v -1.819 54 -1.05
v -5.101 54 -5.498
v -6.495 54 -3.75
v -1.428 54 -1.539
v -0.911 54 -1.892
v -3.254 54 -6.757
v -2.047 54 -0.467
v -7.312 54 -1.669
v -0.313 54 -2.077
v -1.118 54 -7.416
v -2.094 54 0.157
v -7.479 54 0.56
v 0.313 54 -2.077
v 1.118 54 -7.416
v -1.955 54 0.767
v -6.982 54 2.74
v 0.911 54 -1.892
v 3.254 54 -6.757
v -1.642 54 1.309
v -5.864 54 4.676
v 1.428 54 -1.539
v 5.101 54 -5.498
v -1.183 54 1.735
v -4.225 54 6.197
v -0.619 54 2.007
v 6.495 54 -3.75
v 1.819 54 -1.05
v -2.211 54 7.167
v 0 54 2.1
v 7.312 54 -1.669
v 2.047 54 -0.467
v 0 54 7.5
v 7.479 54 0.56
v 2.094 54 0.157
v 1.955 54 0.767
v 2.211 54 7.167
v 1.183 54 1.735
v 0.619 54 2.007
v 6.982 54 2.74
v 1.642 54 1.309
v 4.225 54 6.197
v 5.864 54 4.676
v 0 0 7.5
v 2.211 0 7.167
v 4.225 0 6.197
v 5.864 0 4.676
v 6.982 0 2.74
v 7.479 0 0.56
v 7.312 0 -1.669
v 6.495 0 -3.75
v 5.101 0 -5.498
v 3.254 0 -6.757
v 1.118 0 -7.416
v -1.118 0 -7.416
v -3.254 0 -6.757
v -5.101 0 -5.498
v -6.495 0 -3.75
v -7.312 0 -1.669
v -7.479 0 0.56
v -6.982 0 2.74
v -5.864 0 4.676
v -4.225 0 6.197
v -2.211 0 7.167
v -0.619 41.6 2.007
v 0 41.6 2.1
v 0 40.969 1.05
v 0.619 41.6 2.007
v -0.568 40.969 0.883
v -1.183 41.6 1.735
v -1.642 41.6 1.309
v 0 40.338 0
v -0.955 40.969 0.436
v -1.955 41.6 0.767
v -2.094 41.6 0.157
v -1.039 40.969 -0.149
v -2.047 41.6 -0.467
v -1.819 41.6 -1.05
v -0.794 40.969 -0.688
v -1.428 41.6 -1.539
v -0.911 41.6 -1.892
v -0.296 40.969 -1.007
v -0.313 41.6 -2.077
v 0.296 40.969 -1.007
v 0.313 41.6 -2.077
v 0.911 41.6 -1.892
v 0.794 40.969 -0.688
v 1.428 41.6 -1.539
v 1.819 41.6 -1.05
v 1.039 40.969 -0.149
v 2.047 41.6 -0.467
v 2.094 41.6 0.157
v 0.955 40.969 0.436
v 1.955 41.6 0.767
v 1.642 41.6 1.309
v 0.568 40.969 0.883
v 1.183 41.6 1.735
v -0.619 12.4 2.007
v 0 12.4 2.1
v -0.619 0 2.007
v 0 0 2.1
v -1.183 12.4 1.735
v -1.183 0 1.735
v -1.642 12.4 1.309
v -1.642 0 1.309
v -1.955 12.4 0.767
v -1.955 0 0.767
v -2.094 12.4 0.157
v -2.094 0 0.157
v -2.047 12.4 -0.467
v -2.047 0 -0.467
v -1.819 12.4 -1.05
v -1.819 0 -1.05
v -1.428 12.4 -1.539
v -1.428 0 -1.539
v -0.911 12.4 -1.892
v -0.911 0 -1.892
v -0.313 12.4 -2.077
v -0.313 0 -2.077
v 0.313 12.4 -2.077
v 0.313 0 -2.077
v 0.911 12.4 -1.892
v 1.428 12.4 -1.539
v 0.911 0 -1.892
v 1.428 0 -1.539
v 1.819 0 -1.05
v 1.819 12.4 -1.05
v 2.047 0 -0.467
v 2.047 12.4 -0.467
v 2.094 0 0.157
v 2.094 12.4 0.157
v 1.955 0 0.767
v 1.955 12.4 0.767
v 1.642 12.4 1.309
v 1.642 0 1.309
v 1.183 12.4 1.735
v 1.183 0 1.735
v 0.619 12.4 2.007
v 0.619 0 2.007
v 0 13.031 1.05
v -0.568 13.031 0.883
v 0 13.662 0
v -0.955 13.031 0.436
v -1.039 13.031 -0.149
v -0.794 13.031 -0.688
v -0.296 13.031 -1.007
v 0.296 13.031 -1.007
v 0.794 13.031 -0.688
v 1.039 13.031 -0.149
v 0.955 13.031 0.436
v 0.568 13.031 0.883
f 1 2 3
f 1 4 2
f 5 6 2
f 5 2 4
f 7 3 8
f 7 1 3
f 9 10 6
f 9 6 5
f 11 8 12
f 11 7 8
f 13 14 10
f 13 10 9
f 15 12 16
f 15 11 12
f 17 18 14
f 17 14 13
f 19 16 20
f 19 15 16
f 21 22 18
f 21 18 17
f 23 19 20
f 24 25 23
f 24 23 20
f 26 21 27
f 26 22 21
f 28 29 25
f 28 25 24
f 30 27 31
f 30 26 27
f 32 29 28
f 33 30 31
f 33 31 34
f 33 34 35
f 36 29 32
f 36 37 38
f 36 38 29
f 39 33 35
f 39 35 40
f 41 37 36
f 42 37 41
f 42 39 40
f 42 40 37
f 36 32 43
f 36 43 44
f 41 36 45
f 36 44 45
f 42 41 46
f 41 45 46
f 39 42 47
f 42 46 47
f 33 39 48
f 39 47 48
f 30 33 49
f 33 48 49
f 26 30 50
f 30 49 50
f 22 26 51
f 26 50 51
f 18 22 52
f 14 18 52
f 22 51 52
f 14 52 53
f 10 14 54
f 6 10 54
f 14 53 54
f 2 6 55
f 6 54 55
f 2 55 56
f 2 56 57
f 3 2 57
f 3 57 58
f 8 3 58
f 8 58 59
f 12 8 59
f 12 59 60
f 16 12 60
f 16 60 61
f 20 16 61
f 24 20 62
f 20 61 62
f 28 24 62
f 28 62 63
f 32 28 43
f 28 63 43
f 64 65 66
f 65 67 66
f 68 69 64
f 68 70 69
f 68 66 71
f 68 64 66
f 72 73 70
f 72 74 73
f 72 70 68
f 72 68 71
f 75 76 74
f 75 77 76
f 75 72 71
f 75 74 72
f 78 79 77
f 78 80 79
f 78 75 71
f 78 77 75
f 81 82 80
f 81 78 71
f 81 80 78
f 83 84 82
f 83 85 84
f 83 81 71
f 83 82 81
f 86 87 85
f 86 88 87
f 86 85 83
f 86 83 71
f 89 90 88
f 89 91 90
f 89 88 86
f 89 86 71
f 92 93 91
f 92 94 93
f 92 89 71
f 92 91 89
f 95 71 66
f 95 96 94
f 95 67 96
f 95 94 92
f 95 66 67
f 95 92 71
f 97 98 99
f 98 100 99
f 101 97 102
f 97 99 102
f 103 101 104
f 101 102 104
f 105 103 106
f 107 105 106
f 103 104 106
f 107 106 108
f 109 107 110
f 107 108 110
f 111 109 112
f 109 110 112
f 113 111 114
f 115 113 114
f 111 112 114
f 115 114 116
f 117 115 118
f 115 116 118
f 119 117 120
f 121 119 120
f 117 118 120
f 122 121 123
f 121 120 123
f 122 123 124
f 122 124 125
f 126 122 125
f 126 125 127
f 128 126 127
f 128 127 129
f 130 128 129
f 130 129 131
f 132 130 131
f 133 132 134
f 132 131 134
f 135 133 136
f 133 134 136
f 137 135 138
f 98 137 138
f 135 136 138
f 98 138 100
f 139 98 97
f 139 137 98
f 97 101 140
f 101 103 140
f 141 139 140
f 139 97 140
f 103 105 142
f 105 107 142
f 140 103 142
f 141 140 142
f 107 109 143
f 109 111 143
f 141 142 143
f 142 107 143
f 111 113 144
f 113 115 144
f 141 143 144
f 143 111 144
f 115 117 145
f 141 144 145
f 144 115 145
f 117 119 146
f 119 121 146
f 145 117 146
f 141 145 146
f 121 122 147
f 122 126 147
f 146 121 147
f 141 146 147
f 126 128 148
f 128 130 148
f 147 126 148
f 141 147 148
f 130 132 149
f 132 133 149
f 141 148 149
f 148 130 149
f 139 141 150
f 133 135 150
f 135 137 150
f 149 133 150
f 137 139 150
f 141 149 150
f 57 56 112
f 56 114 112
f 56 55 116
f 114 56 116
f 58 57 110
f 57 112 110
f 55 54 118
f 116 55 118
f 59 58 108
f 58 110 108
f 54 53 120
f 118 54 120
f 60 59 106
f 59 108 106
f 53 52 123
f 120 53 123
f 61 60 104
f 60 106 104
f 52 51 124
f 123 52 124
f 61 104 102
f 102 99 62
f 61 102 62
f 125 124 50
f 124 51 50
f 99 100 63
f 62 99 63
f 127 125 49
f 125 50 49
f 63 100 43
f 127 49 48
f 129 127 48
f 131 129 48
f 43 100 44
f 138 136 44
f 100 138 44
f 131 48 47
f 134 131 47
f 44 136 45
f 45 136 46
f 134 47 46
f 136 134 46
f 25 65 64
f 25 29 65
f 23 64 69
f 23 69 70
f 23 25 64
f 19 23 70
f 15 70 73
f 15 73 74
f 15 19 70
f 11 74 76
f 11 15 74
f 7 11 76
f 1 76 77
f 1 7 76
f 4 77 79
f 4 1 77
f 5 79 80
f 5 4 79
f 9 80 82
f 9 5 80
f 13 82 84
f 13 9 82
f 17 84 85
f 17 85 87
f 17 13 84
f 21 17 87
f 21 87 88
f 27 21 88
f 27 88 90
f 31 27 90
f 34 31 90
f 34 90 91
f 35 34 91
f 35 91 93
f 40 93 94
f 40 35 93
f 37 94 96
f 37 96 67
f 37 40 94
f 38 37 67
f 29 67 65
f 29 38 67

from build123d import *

# Parameters (mm, degrees)
SKETCH1_R           = 7.5
BOSS_EXTRUDE1_DEPTH = 54


with BuildPart() as part:
    # Sketch1 → Boss-Extrude1 (new body)
    with BuildSketch(Plane(origin=(0, 0, 0), x_dir=(1, 0, 0), z_dir=(0, 1, 0))):
        with Locations(Location((0, 0, 0), (0, 0, 270))):
            Circle(SKETCH1_R)
    extrude(amount=BOSS_EXTRUDE1_DEPTH)

    # Sketch3 → M5 Tapped Hole1 (revolve, cut)
    with BuildSketch(Plane(origin=(0, 54, 0), x_dir=(0, 0, 1), z_dir=(1, 0, 0))):
        Polygon((0, 0), (0, 13.6618073), (2.1, 12.4), (2.1, 0), align=None)
    m5_tapped_hole1 = revolve(axis=Axis((0, 60.35, 0), (0, -1, 0)), mode=Mode.SUBTRACT)

    # Mirror1: M5 Tapped Hole1 across plane
    add(m5_tapped_hole1.mirror(Plane.ZX.offset(27)), mode=Mode.SUBTRACT)


solid = part.part
